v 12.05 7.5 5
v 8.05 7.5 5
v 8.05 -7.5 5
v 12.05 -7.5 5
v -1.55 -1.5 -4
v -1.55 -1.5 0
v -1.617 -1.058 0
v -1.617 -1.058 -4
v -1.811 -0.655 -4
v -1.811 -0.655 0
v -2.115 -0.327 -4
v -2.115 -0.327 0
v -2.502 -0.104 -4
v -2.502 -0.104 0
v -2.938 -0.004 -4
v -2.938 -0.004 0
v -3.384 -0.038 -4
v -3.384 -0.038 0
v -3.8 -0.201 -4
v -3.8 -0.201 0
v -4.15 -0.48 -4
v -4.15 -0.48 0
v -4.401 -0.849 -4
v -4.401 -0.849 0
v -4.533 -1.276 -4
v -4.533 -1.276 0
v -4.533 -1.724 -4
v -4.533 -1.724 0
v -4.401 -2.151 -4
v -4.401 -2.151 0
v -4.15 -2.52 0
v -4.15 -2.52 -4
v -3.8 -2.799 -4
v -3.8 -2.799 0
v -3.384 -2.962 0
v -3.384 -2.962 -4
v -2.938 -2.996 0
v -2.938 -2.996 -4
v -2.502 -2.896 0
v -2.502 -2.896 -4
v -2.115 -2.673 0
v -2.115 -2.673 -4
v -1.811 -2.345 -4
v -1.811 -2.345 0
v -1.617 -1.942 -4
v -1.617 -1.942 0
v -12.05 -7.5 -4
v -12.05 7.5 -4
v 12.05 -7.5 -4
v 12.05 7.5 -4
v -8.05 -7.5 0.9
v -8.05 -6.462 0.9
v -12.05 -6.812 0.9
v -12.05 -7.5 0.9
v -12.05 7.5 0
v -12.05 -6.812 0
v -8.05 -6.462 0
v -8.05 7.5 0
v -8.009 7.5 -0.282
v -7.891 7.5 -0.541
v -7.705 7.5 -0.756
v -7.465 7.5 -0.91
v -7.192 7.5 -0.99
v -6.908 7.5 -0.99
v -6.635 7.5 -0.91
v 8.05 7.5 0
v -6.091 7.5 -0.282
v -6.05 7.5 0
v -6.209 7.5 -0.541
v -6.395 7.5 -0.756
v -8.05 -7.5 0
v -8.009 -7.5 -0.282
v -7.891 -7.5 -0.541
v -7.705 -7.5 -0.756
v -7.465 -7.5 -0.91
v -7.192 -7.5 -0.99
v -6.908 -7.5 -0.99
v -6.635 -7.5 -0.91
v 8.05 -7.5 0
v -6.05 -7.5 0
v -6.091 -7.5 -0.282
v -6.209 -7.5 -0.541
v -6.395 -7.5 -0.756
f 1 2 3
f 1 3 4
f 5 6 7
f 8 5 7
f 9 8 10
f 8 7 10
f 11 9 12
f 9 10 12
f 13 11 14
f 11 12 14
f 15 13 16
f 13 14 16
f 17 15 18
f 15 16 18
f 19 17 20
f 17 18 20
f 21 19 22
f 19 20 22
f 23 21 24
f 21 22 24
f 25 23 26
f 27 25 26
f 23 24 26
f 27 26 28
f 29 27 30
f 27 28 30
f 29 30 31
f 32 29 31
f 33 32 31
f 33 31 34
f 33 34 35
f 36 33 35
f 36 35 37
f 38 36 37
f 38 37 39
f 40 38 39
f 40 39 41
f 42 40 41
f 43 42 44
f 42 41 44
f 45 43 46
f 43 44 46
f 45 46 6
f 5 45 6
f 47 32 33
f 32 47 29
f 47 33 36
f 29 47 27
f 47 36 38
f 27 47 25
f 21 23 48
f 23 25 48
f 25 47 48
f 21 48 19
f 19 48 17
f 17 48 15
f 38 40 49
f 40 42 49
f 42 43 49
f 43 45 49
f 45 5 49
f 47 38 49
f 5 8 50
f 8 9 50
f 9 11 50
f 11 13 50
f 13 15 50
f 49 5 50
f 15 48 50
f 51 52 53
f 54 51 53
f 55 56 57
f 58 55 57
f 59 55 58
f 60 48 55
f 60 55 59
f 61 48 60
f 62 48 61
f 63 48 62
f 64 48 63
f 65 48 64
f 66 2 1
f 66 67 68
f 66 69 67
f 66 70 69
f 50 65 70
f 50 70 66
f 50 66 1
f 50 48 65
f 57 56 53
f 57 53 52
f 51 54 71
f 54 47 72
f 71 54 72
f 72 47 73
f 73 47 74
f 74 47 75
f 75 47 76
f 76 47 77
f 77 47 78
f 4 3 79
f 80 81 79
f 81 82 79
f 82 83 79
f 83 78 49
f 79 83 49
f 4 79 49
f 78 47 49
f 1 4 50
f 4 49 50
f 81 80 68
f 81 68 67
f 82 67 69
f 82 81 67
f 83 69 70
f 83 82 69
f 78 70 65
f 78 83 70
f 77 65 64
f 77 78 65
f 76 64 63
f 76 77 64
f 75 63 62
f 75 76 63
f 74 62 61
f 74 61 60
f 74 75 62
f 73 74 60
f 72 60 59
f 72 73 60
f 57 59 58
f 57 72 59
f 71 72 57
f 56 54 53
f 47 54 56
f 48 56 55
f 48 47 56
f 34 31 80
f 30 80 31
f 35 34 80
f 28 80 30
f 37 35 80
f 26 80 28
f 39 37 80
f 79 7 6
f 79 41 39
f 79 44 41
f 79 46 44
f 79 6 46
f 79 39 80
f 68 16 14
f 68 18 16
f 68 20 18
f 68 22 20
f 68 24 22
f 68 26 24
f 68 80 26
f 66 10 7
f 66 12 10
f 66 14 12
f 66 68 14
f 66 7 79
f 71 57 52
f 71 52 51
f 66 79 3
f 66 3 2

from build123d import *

# Parameters (mm, degrees)
SKETCH_1_W          = 24.1
SKETCH_1_H          = 15
EXTRUDE_1_DEPTH     = 4
CUT_EXTRUDE_1_DEPTH = 15
EXTRUDE_2_DEPTH     = 0.9
SKETCH_4_R          = 1.5
CUT_EXTRUDE_2_DEPTH = 4
SKETCH_5_W          = 4
SKETCH_5_H          = 15
EXTRUDE_3_DEPTH     = 5


with BuildPart() as part:
    # 草图1 → 凸台-拉伸1 (new body)
    with BuildSketch(Plane.XY):
        Rectangle(SKETCH_1_W, SKETCH_1_H)
    extrude(amount=-EXTRUDE_1_DEPTH)

    # 草图2 → 切除-拉伸1 (cut)
    with BuildSketch(Plane.XZ.offset(7.5)):
        with BuildLine():
            Line((-8.05, 0), (-6.05, 0))
            ThreePointArc((-6.05, 0), (-7.05, -1), (-8.05, 0))
        make_face()
    extrude(amount=-CUT_EXTRUDE_1_DEPTH, mode=Mode.SUBTRACT)

    # 草图3 → 凸台-拉伸2 (add)
    with BuildSketch(Plane.XY):
        Polygon((-8.05, -6.462156705), (-8.05, -7.5), (-12.05, -7.5), (-12.05, -6.812111359), align=None)
    extrude(amount=EXTRUDE_2_DEPTH)

    # 草图4 → 切除-拉伸2 (cut)
    with BuildSketch(Plane.XY):
        with Locations((-3.05, -1.5)):
            Circle(SKETCH_4_R)
    extrude(amount=-CUT_EXTRUDE_2_DEPTH, mode=Mode.SUBTRACT)

    # 草图5 → 凸台-拉伸3 (add)
    with BuildSketch(Plane.XY):
        with Locations((10.05, 0)):
            Rectangle(SKETCH_5_W, SKETCH_5_H)
    extrude(amount=EXTRUDE_3_DEPTH)


solid = part.part
